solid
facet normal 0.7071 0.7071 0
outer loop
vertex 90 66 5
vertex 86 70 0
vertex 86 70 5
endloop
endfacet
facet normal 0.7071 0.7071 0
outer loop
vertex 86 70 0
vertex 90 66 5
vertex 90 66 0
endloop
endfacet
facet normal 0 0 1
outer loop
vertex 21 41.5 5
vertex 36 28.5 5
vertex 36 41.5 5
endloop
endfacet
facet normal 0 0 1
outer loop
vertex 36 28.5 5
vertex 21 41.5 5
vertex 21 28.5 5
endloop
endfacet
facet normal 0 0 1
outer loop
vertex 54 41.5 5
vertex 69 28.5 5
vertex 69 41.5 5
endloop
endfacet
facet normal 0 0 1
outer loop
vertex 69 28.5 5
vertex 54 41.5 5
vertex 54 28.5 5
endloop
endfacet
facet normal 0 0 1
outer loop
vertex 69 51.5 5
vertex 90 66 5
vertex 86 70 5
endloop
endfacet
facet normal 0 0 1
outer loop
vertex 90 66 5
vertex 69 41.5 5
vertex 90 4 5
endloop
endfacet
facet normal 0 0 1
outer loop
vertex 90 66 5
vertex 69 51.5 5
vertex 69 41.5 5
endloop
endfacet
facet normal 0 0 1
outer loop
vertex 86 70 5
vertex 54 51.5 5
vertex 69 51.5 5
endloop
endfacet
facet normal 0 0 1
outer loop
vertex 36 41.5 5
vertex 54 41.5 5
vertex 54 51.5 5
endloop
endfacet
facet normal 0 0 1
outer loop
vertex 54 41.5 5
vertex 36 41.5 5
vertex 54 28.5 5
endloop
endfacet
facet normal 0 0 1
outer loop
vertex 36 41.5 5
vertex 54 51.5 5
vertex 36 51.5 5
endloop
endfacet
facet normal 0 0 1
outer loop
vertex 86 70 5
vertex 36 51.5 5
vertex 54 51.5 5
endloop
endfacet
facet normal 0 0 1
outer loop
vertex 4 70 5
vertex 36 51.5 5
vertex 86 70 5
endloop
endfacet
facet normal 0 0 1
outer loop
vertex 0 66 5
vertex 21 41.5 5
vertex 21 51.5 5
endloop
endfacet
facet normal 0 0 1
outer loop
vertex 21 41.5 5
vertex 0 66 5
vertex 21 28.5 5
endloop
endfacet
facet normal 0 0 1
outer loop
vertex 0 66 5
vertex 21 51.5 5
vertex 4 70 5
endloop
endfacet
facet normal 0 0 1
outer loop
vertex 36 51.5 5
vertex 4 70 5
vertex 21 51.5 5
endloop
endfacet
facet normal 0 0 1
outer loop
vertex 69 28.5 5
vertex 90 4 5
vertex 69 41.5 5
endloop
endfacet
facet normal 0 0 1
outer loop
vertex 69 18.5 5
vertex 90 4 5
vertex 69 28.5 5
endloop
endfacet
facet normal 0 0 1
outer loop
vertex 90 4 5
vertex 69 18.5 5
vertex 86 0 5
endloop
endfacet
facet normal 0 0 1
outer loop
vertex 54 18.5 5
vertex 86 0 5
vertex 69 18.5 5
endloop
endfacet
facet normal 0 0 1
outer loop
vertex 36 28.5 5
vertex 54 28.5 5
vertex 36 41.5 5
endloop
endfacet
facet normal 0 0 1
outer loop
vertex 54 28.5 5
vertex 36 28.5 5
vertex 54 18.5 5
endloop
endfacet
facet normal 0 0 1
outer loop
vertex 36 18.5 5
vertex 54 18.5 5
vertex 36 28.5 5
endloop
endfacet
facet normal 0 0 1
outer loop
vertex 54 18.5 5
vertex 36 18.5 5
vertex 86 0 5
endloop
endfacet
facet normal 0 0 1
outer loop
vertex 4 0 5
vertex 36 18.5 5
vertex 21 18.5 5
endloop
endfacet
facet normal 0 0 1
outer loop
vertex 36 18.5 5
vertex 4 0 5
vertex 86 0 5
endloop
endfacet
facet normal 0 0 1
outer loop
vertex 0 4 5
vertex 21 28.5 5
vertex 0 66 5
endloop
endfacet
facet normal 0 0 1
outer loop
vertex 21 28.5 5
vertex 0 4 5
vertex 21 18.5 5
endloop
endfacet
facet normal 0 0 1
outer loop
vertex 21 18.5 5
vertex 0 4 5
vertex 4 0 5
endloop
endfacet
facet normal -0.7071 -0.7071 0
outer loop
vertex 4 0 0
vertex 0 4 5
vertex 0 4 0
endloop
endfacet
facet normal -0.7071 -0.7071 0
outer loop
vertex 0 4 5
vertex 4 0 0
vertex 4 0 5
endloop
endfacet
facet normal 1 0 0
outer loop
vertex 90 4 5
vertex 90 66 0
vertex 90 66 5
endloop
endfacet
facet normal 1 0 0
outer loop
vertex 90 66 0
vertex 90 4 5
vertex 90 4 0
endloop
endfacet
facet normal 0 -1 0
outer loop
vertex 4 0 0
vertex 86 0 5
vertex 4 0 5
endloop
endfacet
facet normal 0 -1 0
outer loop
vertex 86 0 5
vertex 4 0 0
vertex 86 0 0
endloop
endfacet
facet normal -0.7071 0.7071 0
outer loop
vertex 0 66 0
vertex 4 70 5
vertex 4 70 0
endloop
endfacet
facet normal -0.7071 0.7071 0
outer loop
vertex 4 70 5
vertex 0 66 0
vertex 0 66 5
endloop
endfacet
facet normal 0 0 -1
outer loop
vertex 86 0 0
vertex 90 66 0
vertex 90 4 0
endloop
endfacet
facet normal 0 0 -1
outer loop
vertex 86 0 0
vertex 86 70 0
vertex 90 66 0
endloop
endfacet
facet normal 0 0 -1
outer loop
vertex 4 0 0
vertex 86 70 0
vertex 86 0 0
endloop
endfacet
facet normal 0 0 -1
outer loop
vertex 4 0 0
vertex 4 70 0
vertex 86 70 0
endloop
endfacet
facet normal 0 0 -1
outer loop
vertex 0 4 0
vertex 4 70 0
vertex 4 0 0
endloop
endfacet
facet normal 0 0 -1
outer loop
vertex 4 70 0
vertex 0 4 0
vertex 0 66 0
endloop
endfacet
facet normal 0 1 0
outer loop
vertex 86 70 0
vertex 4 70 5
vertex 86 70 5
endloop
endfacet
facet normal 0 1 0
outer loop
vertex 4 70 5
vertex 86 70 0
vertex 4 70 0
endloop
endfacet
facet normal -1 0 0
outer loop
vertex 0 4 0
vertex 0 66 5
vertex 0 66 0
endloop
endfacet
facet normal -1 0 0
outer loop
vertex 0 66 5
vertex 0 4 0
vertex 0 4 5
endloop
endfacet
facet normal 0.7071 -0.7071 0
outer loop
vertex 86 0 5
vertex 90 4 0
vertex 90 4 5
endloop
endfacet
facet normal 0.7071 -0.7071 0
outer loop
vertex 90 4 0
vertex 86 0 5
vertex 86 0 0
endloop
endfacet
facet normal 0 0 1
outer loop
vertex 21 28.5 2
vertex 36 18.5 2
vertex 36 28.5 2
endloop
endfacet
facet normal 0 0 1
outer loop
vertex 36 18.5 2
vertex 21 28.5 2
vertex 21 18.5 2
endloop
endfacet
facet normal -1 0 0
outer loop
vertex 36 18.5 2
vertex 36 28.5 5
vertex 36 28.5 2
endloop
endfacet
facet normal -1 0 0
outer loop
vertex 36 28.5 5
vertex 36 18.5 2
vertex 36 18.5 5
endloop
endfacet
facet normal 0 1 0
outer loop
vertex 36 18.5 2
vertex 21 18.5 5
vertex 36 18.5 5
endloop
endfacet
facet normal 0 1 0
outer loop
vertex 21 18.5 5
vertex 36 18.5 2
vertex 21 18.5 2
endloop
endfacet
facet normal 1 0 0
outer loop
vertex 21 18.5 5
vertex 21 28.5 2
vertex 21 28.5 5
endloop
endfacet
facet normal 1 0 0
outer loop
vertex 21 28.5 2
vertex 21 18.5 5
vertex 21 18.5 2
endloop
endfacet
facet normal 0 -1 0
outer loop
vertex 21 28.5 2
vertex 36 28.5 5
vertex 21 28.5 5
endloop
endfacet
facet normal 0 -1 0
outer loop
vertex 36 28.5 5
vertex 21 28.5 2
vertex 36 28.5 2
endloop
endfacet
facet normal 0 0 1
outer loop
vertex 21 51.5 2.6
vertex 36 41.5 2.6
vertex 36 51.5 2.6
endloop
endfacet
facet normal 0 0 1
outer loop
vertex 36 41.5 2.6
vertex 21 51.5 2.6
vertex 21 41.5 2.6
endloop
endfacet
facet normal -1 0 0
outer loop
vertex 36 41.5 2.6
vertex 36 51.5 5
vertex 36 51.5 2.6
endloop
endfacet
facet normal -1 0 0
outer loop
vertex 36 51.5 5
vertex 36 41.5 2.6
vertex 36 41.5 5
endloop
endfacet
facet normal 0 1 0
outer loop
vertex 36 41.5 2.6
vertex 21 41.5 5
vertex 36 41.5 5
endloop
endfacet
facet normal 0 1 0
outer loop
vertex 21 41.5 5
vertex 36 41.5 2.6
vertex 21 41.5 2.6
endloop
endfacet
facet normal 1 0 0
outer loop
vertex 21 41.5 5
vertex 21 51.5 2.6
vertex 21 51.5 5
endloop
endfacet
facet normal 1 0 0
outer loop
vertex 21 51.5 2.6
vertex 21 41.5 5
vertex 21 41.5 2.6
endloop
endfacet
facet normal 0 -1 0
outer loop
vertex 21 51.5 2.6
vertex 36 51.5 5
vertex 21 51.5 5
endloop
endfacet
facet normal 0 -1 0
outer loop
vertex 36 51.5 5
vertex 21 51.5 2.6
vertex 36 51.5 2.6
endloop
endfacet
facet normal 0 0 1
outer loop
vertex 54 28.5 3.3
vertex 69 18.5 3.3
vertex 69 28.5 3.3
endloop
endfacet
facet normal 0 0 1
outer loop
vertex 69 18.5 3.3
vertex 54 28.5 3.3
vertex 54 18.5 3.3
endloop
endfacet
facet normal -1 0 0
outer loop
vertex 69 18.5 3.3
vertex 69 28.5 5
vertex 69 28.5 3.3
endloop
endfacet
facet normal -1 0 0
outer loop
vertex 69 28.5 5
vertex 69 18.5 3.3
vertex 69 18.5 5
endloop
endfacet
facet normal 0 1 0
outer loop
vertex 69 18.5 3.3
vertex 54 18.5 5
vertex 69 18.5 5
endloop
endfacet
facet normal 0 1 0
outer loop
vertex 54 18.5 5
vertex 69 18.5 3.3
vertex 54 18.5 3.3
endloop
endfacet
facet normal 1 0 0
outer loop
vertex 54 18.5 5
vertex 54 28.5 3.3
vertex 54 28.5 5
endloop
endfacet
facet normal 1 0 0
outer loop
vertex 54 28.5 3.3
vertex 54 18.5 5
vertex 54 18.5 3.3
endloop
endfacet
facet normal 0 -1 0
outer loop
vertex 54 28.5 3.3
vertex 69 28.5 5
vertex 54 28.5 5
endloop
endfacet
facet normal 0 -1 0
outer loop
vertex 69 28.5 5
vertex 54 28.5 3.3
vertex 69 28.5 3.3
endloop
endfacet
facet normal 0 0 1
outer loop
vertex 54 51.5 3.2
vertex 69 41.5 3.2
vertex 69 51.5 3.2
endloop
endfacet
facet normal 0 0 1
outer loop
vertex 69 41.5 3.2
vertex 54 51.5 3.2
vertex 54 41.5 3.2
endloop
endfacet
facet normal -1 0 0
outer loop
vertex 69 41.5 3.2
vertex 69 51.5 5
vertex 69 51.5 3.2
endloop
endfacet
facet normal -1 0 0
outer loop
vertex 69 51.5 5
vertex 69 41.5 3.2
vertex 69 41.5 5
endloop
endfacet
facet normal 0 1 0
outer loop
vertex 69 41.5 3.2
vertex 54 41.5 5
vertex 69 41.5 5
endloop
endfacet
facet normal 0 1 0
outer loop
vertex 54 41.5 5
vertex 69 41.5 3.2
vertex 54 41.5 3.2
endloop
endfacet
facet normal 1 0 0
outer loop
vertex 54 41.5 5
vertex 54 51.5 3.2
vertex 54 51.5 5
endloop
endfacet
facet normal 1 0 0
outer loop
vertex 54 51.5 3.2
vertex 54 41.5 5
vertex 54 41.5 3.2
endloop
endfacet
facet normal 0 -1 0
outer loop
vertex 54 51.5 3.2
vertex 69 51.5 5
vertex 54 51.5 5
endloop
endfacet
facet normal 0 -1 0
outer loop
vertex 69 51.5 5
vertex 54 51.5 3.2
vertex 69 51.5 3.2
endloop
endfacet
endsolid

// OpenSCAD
$fn = 32;

// ----------------------------------------------------------------------
// Windowed plate: 4 voids, 90 x 70 x 5 mm
// ----------------------------------------------------------------------

// --- parameters (mm) ---
plate_l = 90;             // plate length, X
plate_w = 70;             // plate width, Y
plate_t = 5;              // plate thickness, Z
edge_margin = 12;         // wall from the plate edge to any window
win_l = 15;               // pocket length
win_w = 10;               // pocket width
pitch_x = 33;             // grid pitch along X
pitch_y = 23;             // grid pitch along Y
depth_1 = 3;              // depth of void 1 (full thickness = through)
depth_2 = 2.4;            // depth of void 2 (full thickness = through)
depth_3 = 1.7;            // depth of void 3 (full thickness = through)
depth_4 = 1.8;            // depth of void 4 (full thickness = through)
corner_c = 4;             // corner chamfer of the plate

profile = [[4, 0], [86, 0], [90, 4], [90, 66], [86, 70], [4, 70], [0, 66], [0, 4]];  // primary outline, 8 points, counter clockwise
void_1 = [[21, 18.5], [36, 18.5], [36, 28.5], [21, 28.5]];  // pocket at grid node 0,0, 4 points
void_2 = [[21, 41.5], [36, 41.5], [36, 51.5], [21, 51.5]];  // pocket at grid node 0,1, 4 points
void_3 = [[54, 18.5], [69, 18.5], [69, 28.5], [54, 28.5]];  // pocket at grid node 1,0, 4 points
void_4 = [[54, 41.5], [69, 41.5], [69, 51.5], [54, 51.5]];  // pocket at grid node 1,1, 4 points

// --- the one profile operation ---
difference() {
  linear_extrude(height = plate_t) polygon(points = profile);
  translate([0, 0, plate_t - depth_1])
    linear_extrude(height = depth_1 + 1) polygon(points = void_1);
  translate([0, 0, plate_t - depth_2])
    linear_extrude(height = depth_2 + 1) polygon(points = void_2);
  translate([0, 0, plate_t - depth_3])
    linear_extrude(height = depth_3 + 1) polygon(points = void_3);
  translate([0, 0, plate_t - depth_4])
    linear_extrude(height = depth_4 + 1) polygon(points = void_4);
}
